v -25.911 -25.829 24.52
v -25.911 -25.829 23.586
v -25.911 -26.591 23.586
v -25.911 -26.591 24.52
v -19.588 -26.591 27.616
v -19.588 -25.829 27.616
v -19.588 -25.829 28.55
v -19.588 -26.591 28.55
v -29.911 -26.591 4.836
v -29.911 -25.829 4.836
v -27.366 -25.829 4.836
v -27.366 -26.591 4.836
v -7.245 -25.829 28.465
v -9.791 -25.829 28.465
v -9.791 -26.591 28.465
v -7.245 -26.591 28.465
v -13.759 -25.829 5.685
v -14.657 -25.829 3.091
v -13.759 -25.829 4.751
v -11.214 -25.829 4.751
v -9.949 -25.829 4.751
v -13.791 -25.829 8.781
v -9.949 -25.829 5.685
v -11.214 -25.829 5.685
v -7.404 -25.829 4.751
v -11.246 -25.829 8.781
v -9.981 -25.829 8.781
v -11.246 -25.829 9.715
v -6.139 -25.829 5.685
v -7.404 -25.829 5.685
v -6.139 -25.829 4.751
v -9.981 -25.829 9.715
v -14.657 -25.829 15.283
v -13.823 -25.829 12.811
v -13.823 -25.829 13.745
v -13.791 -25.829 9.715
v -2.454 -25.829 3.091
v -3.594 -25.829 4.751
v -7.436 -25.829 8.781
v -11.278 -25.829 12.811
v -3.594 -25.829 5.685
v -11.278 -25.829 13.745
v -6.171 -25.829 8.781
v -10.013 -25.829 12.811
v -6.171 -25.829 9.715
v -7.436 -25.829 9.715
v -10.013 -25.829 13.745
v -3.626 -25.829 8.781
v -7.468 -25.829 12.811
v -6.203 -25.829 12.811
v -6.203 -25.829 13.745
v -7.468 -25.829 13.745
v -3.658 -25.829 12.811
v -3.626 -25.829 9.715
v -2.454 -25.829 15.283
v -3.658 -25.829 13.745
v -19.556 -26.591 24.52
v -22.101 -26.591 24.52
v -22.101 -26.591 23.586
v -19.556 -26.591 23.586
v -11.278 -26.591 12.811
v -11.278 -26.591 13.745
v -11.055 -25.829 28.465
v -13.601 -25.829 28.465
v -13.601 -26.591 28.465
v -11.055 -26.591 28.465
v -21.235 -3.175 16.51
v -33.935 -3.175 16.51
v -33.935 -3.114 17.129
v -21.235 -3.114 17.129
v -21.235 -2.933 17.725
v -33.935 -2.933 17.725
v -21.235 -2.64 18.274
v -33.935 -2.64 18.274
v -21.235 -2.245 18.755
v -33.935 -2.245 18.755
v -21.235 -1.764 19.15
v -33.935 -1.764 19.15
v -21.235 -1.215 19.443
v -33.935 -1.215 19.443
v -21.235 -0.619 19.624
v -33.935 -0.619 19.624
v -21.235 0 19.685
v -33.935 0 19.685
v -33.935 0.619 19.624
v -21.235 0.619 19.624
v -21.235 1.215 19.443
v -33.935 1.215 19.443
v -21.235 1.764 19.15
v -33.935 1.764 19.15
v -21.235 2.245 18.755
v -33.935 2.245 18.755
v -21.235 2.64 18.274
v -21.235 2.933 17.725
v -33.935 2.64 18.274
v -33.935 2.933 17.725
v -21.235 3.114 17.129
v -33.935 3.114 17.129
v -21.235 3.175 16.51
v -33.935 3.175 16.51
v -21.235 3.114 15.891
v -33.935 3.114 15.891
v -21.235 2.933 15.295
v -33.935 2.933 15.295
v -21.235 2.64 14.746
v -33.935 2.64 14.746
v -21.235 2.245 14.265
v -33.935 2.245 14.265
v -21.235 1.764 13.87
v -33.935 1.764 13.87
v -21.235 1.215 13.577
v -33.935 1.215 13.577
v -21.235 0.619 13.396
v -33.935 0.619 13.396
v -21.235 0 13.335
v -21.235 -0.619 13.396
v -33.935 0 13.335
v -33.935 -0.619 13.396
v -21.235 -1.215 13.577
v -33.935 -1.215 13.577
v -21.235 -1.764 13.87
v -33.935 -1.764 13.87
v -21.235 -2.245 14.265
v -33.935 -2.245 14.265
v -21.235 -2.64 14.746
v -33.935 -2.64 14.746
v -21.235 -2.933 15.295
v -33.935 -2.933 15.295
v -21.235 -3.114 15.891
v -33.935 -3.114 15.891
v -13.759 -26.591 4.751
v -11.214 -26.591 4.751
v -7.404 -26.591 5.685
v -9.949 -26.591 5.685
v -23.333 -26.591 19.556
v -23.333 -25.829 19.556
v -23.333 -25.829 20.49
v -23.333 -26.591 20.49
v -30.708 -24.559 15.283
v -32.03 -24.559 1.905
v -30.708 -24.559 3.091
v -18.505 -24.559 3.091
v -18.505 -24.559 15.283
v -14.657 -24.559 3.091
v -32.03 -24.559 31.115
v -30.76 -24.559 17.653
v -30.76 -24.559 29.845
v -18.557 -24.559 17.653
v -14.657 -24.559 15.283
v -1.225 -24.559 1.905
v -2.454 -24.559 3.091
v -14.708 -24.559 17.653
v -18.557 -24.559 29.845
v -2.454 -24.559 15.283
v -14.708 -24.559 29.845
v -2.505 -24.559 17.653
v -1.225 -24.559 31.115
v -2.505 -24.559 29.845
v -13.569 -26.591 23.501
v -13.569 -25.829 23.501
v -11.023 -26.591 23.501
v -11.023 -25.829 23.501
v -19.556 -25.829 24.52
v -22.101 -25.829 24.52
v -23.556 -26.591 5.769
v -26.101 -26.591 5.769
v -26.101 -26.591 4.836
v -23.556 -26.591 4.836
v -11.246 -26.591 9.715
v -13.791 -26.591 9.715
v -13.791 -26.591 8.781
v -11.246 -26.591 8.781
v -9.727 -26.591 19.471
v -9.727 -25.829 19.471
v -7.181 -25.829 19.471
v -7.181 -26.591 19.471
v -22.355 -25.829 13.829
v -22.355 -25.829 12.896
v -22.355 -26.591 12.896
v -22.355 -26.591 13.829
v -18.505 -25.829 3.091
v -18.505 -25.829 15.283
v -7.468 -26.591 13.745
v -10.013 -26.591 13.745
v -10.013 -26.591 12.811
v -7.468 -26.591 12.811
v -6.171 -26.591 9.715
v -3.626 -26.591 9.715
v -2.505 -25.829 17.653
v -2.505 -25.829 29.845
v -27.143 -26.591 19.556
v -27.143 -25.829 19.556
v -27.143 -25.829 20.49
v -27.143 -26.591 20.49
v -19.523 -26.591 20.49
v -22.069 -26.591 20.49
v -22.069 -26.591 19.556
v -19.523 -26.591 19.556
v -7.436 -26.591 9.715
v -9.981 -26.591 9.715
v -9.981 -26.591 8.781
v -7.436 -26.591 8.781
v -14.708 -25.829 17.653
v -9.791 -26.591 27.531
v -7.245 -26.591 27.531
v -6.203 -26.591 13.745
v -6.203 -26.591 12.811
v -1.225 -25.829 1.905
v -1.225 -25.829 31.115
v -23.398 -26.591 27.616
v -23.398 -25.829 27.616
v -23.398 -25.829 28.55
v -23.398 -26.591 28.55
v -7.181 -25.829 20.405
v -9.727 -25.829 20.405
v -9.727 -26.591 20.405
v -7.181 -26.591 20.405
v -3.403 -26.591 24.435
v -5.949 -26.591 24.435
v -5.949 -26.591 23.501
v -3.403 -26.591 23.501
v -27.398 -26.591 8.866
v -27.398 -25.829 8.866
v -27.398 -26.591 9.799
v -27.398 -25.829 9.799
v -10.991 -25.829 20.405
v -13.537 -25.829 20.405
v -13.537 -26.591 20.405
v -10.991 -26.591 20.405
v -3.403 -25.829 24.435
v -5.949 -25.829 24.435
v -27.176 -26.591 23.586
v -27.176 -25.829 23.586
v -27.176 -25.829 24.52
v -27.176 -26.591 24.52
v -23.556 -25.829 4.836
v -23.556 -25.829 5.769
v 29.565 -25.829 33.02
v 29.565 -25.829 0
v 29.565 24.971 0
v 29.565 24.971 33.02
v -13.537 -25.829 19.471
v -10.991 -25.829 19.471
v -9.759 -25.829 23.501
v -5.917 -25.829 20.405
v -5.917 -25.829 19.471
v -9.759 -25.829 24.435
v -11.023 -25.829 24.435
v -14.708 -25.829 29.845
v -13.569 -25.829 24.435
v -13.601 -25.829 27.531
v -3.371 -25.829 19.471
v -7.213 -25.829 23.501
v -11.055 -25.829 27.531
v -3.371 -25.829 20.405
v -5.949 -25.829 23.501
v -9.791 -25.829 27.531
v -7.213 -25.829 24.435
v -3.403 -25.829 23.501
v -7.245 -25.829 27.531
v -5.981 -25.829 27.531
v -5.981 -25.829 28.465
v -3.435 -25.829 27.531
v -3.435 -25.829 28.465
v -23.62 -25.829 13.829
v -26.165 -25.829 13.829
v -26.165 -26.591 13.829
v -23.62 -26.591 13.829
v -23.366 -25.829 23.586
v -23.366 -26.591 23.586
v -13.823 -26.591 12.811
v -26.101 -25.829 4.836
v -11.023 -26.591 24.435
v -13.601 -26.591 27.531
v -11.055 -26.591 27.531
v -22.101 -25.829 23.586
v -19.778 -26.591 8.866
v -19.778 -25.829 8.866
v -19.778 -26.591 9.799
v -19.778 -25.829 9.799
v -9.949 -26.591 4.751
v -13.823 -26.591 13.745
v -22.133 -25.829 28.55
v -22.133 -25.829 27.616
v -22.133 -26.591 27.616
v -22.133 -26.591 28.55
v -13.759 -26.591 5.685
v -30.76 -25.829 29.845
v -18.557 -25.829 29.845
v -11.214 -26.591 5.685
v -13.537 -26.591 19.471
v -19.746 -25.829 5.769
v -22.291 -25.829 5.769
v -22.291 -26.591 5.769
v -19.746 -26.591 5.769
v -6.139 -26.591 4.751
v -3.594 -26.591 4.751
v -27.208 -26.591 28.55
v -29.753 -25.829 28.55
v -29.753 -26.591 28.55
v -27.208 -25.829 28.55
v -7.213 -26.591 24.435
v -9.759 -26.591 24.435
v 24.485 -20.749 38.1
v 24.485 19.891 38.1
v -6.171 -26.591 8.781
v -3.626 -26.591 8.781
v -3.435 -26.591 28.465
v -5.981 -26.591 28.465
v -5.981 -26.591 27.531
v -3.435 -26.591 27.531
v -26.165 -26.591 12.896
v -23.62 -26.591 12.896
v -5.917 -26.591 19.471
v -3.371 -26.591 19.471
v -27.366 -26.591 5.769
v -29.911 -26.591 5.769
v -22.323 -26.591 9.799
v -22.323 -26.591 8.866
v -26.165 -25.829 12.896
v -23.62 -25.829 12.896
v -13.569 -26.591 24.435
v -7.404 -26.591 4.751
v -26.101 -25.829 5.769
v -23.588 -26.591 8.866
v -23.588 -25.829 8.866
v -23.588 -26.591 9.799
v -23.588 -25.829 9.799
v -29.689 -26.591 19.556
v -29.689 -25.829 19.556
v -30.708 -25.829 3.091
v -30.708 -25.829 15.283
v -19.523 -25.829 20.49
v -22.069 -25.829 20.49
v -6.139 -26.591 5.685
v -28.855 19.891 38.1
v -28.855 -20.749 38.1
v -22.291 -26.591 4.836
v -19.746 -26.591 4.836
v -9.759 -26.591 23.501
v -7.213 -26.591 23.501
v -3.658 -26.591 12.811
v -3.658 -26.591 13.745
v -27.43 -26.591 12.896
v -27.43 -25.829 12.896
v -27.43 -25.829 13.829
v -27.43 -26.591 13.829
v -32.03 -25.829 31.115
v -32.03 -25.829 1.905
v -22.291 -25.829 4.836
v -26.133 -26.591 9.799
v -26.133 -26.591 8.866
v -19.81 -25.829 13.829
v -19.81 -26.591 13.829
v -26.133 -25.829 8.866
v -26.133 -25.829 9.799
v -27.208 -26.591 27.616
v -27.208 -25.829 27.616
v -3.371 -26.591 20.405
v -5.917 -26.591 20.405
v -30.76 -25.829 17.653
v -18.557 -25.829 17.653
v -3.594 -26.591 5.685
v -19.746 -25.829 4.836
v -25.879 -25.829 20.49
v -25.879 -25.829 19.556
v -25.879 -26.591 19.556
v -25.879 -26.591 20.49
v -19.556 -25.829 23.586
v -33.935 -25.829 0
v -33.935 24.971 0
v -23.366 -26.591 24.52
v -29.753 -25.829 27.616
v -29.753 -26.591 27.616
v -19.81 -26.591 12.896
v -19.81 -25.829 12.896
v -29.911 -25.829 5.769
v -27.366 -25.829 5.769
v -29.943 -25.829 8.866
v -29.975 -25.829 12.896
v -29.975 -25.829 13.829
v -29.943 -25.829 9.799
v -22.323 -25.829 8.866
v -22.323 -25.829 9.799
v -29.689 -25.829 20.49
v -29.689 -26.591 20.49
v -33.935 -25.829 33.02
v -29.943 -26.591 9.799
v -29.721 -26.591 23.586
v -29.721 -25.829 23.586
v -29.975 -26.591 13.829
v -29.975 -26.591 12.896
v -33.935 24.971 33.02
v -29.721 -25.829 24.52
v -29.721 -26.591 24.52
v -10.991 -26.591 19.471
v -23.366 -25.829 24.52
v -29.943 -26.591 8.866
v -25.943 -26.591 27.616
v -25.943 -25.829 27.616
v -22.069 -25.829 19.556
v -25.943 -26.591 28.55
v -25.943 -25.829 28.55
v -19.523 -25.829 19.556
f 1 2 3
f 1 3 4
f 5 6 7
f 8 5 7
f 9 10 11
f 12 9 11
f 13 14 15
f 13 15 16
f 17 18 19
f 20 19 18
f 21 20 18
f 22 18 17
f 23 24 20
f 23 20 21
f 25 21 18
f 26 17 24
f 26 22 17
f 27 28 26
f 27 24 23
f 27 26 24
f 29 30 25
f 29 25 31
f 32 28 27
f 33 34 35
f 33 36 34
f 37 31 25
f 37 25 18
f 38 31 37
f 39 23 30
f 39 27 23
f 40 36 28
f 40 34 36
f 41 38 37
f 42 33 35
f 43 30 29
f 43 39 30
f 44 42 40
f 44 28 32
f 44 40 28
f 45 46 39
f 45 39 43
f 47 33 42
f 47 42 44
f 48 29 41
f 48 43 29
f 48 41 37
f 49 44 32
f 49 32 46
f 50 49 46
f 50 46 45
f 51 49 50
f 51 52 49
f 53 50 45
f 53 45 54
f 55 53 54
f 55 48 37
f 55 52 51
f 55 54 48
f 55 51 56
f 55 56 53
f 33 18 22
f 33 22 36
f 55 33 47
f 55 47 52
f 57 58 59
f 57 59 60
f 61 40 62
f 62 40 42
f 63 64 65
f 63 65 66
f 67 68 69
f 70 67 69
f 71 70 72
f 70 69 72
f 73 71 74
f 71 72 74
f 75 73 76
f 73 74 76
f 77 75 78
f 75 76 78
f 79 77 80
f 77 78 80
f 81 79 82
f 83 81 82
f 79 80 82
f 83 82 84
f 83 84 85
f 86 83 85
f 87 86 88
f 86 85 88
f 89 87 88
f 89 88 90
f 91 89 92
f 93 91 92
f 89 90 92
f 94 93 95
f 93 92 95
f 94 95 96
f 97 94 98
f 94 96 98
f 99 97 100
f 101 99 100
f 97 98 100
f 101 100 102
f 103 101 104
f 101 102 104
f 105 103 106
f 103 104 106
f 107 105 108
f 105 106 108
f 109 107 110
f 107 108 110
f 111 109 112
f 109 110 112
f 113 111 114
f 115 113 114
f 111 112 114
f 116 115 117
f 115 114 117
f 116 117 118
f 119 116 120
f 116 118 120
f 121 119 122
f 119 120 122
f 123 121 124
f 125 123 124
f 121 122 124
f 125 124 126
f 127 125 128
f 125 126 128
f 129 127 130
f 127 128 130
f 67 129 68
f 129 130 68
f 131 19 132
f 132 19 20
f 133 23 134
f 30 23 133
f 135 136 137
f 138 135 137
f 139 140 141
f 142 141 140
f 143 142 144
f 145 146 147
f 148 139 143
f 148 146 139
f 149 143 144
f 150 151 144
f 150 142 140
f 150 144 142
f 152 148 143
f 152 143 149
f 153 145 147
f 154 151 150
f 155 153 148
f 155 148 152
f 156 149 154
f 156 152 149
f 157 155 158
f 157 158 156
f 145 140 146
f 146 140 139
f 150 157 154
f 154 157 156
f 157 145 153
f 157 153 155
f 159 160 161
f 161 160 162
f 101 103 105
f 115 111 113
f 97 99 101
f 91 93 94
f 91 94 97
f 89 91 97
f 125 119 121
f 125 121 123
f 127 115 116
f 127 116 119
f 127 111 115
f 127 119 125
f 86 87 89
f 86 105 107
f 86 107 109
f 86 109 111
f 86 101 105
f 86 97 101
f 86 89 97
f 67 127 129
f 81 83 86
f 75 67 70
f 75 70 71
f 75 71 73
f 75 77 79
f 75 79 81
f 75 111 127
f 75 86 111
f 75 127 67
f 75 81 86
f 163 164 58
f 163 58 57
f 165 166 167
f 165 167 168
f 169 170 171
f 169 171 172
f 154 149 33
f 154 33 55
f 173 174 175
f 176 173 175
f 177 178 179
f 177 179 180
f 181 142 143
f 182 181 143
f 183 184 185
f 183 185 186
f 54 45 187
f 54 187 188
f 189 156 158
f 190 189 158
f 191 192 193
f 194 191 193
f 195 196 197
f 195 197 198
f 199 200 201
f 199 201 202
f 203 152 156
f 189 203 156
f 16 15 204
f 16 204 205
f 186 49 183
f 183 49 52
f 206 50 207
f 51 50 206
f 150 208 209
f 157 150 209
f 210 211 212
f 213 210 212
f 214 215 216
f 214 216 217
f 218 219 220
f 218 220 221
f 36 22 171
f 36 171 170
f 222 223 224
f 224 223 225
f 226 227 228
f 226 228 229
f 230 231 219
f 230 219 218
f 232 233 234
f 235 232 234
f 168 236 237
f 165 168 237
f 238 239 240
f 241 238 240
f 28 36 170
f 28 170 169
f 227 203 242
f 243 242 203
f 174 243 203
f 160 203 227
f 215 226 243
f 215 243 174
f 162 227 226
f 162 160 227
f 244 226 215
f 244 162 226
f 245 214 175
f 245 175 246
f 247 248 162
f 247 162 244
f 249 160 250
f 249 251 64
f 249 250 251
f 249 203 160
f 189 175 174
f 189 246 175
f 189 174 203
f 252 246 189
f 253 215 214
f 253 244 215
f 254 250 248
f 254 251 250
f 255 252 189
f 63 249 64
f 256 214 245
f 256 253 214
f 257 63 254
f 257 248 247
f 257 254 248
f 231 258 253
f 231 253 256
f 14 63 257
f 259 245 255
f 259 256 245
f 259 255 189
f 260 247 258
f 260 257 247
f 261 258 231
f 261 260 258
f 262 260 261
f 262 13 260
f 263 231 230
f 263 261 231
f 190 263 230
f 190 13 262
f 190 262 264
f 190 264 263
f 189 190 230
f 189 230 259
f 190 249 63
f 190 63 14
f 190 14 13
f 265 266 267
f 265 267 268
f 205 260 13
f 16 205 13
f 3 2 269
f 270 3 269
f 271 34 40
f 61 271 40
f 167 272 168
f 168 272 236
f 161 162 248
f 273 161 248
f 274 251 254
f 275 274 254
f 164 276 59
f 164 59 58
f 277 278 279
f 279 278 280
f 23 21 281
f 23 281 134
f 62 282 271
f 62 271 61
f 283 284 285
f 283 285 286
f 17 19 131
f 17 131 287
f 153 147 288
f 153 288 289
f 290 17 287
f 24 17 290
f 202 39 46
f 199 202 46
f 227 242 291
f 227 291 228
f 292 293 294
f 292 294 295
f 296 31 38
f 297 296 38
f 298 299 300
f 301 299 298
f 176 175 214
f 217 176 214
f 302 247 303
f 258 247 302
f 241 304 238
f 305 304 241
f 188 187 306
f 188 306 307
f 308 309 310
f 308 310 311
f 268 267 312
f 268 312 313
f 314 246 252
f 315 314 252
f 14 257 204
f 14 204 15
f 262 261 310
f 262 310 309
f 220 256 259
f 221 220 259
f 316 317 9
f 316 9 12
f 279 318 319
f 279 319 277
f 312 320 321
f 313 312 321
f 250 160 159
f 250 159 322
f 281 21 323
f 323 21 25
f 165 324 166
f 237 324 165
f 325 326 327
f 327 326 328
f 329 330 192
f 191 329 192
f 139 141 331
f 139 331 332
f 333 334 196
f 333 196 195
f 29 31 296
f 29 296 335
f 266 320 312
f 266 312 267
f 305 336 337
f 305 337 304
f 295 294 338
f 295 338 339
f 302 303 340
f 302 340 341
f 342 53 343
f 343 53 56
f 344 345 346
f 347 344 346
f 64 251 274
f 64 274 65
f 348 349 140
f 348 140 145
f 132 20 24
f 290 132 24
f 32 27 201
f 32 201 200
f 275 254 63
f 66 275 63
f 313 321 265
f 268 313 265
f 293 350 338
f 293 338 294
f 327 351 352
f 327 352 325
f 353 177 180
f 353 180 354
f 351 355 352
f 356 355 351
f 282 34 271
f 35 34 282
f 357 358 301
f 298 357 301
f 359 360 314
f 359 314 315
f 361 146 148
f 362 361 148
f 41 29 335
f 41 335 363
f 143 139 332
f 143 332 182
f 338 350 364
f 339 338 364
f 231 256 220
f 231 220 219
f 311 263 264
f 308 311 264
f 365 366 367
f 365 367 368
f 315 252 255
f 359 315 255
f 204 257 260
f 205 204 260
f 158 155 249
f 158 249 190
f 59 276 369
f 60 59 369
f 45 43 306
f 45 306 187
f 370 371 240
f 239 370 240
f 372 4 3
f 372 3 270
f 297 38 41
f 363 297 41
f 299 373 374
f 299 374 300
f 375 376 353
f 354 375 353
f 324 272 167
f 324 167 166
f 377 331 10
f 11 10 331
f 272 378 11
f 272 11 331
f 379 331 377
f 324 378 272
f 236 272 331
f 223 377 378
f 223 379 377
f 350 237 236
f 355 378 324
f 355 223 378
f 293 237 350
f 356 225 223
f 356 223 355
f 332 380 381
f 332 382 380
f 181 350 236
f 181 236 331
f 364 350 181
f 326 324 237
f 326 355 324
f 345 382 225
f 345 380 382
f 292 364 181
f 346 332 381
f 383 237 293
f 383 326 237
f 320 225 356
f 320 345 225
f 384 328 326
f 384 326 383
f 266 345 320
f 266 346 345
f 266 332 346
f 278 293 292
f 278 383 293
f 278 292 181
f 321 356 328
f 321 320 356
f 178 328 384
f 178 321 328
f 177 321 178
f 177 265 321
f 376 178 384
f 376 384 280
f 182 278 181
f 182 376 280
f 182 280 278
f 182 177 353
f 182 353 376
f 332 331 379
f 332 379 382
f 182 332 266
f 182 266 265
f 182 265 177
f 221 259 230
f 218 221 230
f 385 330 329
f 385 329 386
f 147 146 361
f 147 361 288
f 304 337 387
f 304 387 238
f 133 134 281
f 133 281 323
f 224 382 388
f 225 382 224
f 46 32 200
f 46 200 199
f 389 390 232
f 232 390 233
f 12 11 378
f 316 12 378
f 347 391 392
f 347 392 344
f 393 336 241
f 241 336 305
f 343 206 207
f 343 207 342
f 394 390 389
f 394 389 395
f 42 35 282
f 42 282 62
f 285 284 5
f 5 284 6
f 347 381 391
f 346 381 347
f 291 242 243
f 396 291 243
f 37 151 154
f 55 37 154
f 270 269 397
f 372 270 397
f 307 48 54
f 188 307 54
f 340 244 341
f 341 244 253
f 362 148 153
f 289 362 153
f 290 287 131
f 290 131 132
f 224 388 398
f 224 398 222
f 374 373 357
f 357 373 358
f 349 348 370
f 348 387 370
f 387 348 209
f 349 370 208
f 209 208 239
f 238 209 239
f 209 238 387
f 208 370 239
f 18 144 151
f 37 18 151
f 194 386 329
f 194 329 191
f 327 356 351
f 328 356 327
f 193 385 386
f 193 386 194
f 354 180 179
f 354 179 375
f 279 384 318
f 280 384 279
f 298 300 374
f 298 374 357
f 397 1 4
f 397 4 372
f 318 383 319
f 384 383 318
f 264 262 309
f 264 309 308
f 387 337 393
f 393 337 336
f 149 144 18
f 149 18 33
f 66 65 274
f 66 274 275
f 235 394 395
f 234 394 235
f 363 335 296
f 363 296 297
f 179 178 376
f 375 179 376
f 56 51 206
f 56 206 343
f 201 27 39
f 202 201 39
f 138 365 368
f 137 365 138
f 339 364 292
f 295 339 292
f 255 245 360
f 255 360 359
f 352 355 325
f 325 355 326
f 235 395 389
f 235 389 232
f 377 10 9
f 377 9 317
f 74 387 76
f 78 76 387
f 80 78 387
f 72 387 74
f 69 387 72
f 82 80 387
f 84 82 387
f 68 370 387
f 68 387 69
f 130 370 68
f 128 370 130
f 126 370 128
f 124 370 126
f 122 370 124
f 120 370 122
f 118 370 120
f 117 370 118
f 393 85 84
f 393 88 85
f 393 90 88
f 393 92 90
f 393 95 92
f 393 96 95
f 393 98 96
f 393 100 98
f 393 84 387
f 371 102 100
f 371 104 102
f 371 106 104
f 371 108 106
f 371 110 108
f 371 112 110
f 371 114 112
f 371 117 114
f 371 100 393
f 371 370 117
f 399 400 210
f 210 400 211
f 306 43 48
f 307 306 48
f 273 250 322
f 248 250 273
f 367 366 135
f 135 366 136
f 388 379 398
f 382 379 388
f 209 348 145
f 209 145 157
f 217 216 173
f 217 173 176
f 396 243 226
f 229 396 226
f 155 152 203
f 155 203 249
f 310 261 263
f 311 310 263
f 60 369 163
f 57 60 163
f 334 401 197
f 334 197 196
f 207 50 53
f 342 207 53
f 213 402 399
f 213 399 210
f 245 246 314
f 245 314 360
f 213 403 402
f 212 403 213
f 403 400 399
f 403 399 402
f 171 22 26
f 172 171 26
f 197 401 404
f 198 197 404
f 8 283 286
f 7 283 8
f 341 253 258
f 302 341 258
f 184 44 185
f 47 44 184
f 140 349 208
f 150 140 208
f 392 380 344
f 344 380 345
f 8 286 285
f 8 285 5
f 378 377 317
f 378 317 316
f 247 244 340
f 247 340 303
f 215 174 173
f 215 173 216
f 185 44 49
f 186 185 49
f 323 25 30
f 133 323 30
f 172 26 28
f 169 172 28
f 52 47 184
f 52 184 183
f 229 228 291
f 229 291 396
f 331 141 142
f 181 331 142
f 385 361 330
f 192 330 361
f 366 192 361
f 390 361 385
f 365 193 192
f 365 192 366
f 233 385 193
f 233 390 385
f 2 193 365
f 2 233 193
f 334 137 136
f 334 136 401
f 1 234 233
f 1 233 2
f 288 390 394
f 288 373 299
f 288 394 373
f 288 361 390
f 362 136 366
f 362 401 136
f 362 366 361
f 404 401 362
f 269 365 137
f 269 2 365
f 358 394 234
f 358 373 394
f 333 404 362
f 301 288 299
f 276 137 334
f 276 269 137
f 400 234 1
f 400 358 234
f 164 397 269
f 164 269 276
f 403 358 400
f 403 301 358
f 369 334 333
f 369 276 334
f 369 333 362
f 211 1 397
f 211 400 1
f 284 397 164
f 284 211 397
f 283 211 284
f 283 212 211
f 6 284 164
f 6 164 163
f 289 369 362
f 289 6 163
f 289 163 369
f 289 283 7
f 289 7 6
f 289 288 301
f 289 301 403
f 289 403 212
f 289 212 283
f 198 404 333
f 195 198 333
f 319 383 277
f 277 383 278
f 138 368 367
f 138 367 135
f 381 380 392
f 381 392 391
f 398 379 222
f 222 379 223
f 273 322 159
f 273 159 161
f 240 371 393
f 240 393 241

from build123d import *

# Parameters (mm, degrees)
F0_W      = 63.5
F0_H      = 50.8
F1_DEPTH  = 38.1
F2_SIZE   = 5.08
F3_R      = 3.175
F4_DEPTH  = 12.7
F5_W      = 30.805484
F5_H      = 29.21
F6_DEPTH  = 1.27
F7_W      = 12.203076
F7_H      = 12.192
F8_DEPTH  = 1.27
F9_W      = 2.545274
F9_H      = 0.933269
F9_W_2    = 2.545275
F10_DEPTH = 0.762


with BuildPart() as f1:
    # F0 (on Top) → F1 (new body)
    with BuildSketch(Plane.XY):
        with Locations((-2.185041, -0.428895)):
            Rectangle(F0_W, F0_H)
    extrude(amount=F1_DEPTH)

    # F2
    f2_edges = [f1.edges().sort_by_distance(p)[0] for p in [
        (-33.935041, -0.428895, 38.1),
        (-2.185041, -25.828895, 38.1),
        (29.564959, -0.428895, 38.1),
        (-2.185041, 24.971105, 38.1),
    ]]
    chamfer(f2_edges, length=F2_SIZE)

    # F3 (on face) → F4 (cut)
    with BuildSketch(Plane(origin=(-33.935041, 0, 0), x_dir=(0, -1, 0), z_dir=(-1, 0, 0))):
        with Locations((0, 16.51)):
            Circle(F3_R)
    extrude(amount=-F4_DEPTH, mode=Mode.SUBTRACT)

    # F5 (on face) → F6 (cut)
    with BuildSketch(Plane.XZ.offset(25.828895)):
        with Locations((-16.627299, 16.51)):
            Rectangle(F5_W, F5_H)
    extrude(amount=-F6_DEPTH, mode=Mode.SUBTRACT)

    # F7 (on face) → F8 (join)
    with BuildSketch(Plane.XZ.offset(24.558895)):
        with Locations((-24.658503, 23.749)):
            Rectangle(F7_W, F7_H)
        with Locations((-8.606803, 23.749)):
            Rectangle(F7_W, F7_H)
        with Locations((-24.606782, 9.18722)):
            Rectangle(F7_W, F7_H)
        with Locations((-8.555082, 9.18722)):
            Rectangle(F7_W, F7_H)
    extrude(amount=F8_DEPTH)

    # F9 (on face) → F10 (join)
    with BuildSketch(Plane.XZ.offset(25.828895)):
        with Locations((-28.48023, 28.082971)):
            Rectangle(F9_W, F9_H)
        with Locations((-24.67023, 28.082971)):
            Rectangle(F9_W, F9_H)
        with Locations((-20.86023, 28.082971)):
            Rectangle(F9_W, F9_H)
        with Locations((-28.448142, 24.052954)):
            Rectangle(F9_W_2, F9_H)
        with Locations((-24.638143, 24.052954)):
            Rectangle(F9_W_2, F9_H)
        with Locations((-20.828142, 24.052954)):
            Rectangle(F9_W_2, F9_H)
        with Locations((-20.796056, 20.022937)):
            Rectangle(F9_W_2, F9_H)
        with Locations((-24.606055, 20.022937)):
            Rectangle(F9_W_2, F9_H)
        with Locations((-28.416055, 20.022937)):
            Rectangle(F9_W_2, F9_H)
        with Locations((-28.702667, 13.362789)):
            Rectangle(F9_W_2, F9_H)
        with Locations((-24.892668, 13.362789)):
            Rectangle(F9_W_2, F9_H)
        with Locations((-21.082667, 13.362789)):
            Rectangle(F9_W_2, F9_H)
        with Locations((-21.05058, 9.332771)):
            Rectangle(F9_W, F9_H)
        with Locations((-24.86058, 9.332771)):
            Rectangle(F9_W, F9_H)
        with Locations((-28.67058, 9.332771)):
            Rectangle(F9_W, F9_H)
        with Locations((-28.638492, 5.302754)):
            Rectangle(F9_W_2, F9_H)
        with Locations((-24.828492, 5.302754)):
            Rectangle(F9_W_2, F9_H)
        with Locations((-21.018493, 5.302754)):
            Rectangle(F9_W_2, F9_H)
        with Locations((-12.518417, 9.247929)):
            Rectangle(F9_W_2, F9_H)
        with Locations((-12.550504, 13.277945)):
            Rectangle(F9_W_2, F9_H)
        with Locations((-8.740505, 13.277945)):
            Rectangle(F9_W_2, F9_H)
        with Locations((-8.708417, 9.247929)):
            Rectangle(F9_W_2, F9_H)
        with Locations((-4.898417, 9.247929)):
            Rectangle(F9_W_2, F9_H)
        with Locations((-4.930504, 13.277945)):
            Rectangle(F9_W_2, F9_H)
        with Locations((-4.86633, 5.217911)):
            Rectangle(F9_W, F9_H)
        with Locations((-8.67633, 5.217911)):
            Rectangle(F9_W, F9_H)
        with Locations((-12.48633, 5.217911)):
            Rectangle(F9_W, F9_H)
        with Locations((-12.328067, 27.998128)):
            Rectangle(F9_W_2, F9_H)
        with Locations((-8.518067, 27.998128)):
            Rectangle(F9_W_2, F9_H)
        with Locations((-4.708067, 27.998128)):
            Rectangle(F9_W_2, F9_H)
        with Locations((-4.67598, 23.968111)):
            Rectangle(F9_W, F9_H)
        with Locations((-8.48598, 23.968111)):
            Rectangle(F9_W, F9_H)
        with Locations((-12.29598, 23.968111)):
            Rectangle(F9_W, F9_H)
        with Locations((-12.263892, 19.938094)):
            Rectangle(F9_W_2, F9_H)
        with Locations((-8.453893, 19.938094)):
            Rectangle(F9_W_2, F9_H)
        with Locations((-4.643892, 19.938094)):
            Rectangle(F9_W_2, F9_H)
    extrude(amount=F10_DEPTH)


solid = f1.part
